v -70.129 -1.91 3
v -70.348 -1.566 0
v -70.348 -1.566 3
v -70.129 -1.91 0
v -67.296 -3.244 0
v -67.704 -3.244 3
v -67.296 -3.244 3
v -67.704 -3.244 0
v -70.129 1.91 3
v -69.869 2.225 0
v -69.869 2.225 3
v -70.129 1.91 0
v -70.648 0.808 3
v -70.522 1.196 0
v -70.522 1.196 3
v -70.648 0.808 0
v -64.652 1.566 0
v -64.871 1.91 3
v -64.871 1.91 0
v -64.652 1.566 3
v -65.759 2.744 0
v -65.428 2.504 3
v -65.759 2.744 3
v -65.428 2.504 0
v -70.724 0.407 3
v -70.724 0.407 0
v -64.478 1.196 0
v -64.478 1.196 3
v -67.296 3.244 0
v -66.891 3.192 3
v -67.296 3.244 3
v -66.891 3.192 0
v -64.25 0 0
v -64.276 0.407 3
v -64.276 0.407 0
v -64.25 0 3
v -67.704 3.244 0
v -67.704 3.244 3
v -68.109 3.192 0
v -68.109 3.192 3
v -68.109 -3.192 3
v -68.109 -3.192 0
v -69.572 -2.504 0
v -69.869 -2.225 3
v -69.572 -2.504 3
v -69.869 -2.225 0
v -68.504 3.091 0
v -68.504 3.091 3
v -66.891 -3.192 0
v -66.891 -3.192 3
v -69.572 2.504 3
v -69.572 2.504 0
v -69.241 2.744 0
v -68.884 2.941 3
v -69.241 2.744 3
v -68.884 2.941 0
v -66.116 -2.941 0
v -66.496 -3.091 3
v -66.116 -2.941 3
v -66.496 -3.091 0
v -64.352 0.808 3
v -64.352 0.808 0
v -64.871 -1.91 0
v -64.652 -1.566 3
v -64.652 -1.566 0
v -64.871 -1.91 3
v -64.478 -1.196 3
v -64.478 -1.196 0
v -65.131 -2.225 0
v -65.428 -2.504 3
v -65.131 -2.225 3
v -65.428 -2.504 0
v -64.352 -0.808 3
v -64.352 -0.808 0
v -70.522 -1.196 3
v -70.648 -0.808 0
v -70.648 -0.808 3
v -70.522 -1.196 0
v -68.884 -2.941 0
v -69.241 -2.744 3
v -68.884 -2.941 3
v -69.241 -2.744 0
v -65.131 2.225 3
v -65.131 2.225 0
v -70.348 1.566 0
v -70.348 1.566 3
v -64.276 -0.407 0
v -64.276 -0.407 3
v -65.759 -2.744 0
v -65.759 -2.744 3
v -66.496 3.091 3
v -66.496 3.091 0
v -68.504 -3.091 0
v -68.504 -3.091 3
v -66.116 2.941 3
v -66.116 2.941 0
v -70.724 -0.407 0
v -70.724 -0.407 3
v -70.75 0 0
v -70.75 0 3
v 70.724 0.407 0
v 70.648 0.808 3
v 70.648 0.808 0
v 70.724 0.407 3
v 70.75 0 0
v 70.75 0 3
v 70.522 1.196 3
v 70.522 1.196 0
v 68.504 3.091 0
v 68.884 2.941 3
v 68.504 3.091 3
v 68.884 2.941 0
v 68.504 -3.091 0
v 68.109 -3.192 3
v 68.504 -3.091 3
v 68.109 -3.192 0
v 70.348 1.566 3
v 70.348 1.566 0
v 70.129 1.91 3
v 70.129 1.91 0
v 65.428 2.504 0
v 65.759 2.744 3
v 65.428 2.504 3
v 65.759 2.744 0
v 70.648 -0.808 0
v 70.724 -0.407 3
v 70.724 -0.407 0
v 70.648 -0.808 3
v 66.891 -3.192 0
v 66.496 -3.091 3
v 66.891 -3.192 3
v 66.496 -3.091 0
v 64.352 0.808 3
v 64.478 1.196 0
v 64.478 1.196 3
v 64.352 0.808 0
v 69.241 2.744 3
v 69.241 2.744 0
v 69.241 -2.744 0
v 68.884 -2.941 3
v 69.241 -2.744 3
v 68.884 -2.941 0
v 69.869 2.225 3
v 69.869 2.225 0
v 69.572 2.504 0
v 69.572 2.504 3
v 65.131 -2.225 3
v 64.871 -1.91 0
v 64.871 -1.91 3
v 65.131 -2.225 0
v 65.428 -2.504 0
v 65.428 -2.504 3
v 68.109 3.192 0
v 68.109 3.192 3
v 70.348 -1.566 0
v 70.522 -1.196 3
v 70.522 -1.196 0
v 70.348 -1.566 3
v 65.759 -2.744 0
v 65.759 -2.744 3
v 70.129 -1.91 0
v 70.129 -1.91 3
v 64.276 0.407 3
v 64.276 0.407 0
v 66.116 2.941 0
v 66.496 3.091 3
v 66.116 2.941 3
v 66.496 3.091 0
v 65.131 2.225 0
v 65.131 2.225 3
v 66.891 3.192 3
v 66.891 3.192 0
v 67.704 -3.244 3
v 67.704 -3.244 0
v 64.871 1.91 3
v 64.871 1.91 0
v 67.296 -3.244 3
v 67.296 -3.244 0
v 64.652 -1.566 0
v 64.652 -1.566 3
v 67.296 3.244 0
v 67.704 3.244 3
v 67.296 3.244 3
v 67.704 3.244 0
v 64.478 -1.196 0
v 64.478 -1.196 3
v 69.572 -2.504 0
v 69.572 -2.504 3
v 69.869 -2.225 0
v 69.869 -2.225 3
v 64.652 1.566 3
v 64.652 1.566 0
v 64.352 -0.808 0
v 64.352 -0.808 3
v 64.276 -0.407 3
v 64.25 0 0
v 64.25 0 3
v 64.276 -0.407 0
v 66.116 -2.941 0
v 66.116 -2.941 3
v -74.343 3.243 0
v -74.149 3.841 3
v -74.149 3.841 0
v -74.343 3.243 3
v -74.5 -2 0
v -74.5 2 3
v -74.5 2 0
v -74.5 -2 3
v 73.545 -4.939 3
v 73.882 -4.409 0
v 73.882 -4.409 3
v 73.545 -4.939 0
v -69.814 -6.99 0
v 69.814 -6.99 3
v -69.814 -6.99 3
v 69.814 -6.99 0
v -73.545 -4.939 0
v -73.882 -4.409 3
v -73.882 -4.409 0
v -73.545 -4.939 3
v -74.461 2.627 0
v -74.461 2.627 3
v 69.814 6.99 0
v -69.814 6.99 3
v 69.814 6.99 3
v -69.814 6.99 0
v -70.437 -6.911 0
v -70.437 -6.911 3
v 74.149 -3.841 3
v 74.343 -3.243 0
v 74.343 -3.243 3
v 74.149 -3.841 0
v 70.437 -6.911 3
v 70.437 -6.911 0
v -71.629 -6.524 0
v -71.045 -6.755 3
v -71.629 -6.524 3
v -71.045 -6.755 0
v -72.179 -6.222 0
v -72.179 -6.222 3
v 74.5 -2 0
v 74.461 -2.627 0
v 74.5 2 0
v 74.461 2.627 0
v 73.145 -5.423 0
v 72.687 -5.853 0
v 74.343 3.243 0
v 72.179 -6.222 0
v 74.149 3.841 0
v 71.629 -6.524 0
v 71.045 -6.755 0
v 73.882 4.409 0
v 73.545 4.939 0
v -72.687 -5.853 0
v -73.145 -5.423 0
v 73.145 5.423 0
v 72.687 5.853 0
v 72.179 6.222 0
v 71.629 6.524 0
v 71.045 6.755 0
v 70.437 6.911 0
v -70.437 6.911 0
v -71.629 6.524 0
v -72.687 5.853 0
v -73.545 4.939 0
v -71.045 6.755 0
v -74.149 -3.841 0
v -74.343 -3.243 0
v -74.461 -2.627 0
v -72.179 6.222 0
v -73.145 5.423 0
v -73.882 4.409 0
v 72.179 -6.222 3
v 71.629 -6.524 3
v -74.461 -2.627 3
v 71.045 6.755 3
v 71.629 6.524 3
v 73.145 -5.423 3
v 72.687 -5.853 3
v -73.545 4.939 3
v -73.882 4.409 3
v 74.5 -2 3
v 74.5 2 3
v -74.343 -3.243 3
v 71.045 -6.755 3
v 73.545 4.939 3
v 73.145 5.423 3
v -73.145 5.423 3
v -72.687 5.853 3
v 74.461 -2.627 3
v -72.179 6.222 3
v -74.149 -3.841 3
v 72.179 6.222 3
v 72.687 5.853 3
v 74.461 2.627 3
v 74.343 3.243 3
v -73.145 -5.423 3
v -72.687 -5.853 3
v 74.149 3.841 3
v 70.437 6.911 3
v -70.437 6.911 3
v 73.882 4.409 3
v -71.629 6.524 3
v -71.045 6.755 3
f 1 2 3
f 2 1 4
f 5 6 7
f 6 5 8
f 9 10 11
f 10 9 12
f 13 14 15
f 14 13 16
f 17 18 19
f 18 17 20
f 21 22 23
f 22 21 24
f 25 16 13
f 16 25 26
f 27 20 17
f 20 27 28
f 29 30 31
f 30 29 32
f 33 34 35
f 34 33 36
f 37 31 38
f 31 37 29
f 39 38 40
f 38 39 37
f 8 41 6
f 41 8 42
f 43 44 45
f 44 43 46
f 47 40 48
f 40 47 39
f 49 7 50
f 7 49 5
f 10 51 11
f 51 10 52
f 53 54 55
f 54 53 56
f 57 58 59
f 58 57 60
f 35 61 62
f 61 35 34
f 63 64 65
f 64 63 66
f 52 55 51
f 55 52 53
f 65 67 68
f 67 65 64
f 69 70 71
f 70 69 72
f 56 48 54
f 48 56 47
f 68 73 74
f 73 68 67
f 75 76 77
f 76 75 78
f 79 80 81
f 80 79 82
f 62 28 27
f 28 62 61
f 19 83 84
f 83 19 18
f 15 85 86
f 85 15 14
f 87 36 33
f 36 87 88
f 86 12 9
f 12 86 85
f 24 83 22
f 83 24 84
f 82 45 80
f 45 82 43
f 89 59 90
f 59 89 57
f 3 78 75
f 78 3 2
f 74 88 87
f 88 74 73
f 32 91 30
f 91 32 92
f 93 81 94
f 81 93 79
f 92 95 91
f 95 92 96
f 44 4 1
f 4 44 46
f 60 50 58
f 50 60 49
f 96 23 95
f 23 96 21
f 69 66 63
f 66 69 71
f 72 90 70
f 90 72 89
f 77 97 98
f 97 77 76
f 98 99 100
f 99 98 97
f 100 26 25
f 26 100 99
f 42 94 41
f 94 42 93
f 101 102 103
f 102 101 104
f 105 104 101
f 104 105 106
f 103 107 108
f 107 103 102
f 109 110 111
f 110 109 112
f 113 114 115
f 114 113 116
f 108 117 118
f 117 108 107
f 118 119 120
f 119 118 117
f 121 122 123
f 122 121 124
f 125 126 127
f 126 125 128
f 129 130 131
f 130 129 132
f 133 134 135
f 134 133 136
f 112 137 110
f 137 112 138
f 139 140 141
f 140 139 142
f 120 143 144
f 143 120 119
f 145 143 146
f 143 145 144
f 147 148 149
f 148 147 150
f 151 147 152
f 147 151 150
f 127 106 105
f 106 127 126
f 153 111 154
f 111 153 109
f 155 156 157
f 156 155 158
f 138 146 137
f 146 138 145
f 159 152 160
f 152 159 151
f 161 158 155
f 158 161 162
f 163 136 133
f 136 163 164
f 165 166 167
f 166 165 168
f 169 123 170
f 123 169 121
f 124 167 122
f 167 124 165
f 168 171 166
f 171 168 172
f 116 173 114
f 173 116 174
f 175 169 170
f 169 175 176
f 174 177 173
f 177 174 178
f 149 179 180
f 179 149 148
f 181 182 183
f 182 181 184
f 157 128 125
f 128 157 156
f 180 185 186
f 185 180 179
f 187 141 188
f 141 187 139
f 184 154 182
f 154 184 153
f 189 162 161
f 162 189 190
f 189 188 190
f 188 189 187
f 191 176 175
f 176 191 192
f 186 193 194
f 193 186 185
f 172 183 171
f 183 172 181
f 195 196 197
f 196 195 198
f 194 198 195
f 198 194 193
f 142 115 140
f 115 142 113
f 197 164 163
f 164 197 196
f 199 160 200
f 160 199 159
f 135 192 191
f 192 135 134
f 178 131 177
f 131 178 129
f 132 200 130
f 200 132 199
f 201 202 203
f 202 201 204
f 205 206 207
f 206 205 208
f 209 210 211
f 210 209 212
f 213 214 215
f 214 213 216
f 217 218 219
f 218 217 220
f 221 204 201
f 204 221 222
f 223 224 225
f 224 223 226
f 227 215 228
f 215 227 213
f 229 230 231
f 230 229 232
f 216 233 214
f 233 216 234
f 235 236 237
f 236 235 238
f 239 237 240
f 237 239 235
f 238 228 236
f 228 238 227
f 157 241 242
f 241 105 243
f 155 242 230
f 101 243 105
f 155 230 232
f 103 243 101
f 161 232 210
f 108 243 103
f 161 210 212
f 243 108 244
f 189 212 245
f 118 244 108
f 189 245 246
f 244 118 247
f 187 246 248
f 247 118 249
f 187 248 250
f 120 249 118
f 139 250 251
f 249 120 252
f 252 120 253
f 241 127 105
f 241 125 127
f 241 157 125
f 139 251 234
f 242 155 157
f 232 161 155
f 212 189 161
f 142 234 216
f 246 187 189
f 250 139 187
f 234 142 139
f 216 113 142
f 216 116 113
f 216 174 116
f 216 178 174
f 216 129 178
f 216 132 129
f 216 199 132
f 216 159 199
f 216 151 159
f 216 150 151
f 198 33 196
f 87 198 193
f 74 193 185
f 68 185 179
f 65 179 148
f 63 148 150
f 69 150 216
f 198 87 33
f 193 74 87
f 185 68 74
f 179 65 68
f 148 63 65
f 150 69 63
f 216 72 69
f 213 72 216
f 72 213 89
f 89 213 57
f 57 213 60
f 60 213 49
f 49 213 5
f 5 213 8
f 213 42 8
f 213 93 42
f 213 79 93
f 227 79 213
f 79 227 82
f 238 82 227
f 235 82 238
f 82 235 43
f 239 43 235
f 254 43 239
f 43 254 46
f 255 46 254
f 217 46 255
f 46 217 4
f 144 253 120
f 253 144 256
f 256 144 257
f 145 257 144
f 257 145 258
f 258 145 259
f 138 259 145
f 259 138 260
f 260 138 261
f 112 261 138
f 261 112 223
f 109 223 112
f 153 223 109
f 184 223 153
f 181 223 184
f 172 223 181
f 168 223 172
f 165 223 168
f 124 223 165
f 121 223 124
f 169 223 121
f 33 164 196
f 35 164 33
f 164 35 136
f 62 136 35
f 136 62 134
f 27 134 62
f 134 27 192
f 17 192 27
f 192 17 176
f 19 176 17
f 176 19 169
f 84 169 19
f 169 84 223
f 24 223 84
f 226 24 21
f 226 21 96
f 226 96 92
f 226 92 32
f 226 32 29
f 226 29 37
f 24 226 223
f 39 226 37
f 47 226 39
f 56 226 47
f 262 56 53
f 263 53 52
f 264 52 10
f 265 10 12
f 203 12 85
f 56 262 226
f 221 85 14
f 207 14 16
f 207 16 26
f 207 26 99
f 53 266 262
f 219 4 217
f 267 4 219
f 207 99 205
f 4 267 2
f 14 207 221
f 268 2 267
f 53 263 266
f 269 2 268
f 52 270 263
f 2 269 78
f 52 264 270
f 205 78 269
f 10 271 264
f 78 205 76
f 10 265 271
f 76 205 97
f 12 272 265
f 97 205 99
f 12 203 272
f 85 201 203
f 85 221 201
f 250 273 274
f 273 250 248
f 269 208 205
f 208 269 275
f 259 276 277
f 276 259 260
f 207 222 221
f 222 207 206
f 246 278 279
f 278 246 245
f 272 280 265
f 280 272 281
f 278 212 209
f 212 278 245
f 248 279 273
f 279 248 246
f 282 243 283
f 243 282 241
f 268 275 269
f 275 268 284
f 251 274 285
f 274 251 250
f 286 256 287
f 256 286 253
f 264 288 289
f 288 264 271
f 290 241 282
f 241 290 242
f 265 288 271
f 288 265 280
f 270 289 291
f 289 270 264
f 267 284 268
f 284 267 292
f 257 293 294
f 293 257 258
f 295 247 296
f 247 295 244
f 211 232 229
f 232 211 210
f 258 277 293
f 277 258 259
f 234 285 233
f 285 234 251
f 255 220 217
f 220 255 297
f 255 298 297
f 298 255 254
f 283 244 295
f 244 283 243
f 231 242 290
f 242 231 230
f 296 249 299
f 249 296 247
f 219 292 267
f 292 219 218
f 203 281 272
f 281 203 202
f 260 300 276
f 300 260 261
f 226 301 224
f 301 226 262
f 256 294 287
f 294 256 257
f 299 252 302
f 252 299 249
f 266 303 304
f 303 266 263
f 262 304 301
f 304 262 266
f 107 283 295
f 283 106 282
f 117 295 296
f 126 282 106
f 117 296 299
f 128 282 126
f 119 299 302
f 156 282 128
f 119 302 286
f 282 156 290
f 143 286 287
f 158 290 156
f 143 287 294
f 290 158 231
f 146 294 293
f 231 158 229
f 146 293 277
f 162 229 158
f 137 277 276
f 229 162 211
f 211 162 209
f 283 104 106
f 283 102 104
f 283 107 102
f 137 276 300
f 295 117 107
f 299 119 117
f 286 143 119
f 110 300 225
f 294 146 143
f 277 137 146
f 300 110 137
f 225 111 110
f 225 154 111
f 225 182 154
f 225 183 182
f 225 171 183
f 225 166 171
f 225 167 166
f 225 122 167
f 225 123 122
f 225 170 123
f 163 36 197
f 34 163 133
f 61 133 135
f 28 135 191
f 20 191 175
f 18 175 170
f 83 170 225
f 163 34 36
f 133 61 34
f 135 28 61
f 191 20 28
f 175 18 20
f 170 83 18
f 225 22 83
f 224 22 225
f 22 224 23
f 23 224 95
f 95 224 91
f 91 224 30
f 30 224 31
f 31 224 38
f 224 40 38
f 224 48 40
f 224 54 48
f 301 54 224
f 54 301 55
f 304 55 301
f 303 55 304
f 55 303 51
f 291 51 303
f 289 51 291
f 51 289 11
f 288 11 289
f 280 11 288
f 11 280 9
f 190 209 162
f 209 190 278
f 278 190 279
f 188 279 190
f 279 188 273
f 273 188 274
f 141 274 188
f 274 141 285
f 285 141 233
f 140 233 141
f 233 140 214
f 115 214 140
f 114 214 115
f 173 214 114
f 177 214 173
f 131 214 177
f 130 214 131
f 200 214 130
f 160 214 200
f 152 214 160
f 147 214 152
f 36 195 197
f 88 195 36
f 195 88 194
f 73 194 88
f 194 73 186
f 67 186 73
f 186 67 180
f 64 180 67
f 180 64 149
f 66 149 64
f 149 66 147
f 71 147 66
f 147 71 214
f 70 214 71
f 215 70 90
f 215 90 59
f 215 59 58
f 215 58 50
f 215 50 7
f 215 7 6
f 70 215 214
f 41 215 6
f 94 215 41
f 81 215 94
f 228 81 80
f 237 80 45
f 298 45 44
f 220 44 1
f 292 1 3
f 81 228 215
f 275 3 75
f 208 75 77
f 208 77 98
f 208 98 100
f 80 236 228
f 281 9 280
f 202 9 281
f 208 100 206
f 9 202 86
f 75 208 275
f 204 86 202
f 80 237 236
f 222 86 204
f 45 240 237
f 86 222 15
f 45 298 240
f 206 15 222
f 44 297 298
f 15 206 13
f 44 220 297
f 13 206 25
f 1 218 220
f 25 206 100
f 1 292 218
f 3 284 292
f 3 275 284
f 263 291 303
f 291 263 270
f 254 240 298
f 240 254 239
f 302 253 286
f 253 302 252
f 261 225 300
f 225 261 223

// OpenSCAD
$fn = 50;


difference() {
	union() {
		hull() {
			translate(v = [-69.5000000000, 2.0000000000, 0]) {
				cylinder(h = 3, r = 5);
			}
			translate(v = [69.5000000000, 2.0000000000, 0]) {
				cylinder(h = 3, r = 5);
			}
			translate(v = [-69.5000000000, -2.0000000000, 0]) {
				cylinder(h = 3, r = 5);
			}
			translate(v = [69.5000000000, -2.0000000000, 0]) {
				cylinder(h = 3, r = 5);
			}
		}
	}
	union() {
		translate(v = [-67.5000000000, 0.0000000000, -100.0000000000]) {
			cylinder(h = 200, r = 3.2500000000);
		}
		translate(v = [-67.5000000000, 0.0000000000, -100.0000000000]) {
			cylinder(h = 200, r = 3.2500000000);
		}
		translate(v = [67.5000000000, 0.0000000000, -100.0000000000]) {
			cylinder(h = 200, r = 3.2500000000);
		}
		translate(v = [67.5000000000, 0.0000000000, -100.0000000000]) {
			cylinder(h = 200, r = 3.2500000000);
		}
	}
}
